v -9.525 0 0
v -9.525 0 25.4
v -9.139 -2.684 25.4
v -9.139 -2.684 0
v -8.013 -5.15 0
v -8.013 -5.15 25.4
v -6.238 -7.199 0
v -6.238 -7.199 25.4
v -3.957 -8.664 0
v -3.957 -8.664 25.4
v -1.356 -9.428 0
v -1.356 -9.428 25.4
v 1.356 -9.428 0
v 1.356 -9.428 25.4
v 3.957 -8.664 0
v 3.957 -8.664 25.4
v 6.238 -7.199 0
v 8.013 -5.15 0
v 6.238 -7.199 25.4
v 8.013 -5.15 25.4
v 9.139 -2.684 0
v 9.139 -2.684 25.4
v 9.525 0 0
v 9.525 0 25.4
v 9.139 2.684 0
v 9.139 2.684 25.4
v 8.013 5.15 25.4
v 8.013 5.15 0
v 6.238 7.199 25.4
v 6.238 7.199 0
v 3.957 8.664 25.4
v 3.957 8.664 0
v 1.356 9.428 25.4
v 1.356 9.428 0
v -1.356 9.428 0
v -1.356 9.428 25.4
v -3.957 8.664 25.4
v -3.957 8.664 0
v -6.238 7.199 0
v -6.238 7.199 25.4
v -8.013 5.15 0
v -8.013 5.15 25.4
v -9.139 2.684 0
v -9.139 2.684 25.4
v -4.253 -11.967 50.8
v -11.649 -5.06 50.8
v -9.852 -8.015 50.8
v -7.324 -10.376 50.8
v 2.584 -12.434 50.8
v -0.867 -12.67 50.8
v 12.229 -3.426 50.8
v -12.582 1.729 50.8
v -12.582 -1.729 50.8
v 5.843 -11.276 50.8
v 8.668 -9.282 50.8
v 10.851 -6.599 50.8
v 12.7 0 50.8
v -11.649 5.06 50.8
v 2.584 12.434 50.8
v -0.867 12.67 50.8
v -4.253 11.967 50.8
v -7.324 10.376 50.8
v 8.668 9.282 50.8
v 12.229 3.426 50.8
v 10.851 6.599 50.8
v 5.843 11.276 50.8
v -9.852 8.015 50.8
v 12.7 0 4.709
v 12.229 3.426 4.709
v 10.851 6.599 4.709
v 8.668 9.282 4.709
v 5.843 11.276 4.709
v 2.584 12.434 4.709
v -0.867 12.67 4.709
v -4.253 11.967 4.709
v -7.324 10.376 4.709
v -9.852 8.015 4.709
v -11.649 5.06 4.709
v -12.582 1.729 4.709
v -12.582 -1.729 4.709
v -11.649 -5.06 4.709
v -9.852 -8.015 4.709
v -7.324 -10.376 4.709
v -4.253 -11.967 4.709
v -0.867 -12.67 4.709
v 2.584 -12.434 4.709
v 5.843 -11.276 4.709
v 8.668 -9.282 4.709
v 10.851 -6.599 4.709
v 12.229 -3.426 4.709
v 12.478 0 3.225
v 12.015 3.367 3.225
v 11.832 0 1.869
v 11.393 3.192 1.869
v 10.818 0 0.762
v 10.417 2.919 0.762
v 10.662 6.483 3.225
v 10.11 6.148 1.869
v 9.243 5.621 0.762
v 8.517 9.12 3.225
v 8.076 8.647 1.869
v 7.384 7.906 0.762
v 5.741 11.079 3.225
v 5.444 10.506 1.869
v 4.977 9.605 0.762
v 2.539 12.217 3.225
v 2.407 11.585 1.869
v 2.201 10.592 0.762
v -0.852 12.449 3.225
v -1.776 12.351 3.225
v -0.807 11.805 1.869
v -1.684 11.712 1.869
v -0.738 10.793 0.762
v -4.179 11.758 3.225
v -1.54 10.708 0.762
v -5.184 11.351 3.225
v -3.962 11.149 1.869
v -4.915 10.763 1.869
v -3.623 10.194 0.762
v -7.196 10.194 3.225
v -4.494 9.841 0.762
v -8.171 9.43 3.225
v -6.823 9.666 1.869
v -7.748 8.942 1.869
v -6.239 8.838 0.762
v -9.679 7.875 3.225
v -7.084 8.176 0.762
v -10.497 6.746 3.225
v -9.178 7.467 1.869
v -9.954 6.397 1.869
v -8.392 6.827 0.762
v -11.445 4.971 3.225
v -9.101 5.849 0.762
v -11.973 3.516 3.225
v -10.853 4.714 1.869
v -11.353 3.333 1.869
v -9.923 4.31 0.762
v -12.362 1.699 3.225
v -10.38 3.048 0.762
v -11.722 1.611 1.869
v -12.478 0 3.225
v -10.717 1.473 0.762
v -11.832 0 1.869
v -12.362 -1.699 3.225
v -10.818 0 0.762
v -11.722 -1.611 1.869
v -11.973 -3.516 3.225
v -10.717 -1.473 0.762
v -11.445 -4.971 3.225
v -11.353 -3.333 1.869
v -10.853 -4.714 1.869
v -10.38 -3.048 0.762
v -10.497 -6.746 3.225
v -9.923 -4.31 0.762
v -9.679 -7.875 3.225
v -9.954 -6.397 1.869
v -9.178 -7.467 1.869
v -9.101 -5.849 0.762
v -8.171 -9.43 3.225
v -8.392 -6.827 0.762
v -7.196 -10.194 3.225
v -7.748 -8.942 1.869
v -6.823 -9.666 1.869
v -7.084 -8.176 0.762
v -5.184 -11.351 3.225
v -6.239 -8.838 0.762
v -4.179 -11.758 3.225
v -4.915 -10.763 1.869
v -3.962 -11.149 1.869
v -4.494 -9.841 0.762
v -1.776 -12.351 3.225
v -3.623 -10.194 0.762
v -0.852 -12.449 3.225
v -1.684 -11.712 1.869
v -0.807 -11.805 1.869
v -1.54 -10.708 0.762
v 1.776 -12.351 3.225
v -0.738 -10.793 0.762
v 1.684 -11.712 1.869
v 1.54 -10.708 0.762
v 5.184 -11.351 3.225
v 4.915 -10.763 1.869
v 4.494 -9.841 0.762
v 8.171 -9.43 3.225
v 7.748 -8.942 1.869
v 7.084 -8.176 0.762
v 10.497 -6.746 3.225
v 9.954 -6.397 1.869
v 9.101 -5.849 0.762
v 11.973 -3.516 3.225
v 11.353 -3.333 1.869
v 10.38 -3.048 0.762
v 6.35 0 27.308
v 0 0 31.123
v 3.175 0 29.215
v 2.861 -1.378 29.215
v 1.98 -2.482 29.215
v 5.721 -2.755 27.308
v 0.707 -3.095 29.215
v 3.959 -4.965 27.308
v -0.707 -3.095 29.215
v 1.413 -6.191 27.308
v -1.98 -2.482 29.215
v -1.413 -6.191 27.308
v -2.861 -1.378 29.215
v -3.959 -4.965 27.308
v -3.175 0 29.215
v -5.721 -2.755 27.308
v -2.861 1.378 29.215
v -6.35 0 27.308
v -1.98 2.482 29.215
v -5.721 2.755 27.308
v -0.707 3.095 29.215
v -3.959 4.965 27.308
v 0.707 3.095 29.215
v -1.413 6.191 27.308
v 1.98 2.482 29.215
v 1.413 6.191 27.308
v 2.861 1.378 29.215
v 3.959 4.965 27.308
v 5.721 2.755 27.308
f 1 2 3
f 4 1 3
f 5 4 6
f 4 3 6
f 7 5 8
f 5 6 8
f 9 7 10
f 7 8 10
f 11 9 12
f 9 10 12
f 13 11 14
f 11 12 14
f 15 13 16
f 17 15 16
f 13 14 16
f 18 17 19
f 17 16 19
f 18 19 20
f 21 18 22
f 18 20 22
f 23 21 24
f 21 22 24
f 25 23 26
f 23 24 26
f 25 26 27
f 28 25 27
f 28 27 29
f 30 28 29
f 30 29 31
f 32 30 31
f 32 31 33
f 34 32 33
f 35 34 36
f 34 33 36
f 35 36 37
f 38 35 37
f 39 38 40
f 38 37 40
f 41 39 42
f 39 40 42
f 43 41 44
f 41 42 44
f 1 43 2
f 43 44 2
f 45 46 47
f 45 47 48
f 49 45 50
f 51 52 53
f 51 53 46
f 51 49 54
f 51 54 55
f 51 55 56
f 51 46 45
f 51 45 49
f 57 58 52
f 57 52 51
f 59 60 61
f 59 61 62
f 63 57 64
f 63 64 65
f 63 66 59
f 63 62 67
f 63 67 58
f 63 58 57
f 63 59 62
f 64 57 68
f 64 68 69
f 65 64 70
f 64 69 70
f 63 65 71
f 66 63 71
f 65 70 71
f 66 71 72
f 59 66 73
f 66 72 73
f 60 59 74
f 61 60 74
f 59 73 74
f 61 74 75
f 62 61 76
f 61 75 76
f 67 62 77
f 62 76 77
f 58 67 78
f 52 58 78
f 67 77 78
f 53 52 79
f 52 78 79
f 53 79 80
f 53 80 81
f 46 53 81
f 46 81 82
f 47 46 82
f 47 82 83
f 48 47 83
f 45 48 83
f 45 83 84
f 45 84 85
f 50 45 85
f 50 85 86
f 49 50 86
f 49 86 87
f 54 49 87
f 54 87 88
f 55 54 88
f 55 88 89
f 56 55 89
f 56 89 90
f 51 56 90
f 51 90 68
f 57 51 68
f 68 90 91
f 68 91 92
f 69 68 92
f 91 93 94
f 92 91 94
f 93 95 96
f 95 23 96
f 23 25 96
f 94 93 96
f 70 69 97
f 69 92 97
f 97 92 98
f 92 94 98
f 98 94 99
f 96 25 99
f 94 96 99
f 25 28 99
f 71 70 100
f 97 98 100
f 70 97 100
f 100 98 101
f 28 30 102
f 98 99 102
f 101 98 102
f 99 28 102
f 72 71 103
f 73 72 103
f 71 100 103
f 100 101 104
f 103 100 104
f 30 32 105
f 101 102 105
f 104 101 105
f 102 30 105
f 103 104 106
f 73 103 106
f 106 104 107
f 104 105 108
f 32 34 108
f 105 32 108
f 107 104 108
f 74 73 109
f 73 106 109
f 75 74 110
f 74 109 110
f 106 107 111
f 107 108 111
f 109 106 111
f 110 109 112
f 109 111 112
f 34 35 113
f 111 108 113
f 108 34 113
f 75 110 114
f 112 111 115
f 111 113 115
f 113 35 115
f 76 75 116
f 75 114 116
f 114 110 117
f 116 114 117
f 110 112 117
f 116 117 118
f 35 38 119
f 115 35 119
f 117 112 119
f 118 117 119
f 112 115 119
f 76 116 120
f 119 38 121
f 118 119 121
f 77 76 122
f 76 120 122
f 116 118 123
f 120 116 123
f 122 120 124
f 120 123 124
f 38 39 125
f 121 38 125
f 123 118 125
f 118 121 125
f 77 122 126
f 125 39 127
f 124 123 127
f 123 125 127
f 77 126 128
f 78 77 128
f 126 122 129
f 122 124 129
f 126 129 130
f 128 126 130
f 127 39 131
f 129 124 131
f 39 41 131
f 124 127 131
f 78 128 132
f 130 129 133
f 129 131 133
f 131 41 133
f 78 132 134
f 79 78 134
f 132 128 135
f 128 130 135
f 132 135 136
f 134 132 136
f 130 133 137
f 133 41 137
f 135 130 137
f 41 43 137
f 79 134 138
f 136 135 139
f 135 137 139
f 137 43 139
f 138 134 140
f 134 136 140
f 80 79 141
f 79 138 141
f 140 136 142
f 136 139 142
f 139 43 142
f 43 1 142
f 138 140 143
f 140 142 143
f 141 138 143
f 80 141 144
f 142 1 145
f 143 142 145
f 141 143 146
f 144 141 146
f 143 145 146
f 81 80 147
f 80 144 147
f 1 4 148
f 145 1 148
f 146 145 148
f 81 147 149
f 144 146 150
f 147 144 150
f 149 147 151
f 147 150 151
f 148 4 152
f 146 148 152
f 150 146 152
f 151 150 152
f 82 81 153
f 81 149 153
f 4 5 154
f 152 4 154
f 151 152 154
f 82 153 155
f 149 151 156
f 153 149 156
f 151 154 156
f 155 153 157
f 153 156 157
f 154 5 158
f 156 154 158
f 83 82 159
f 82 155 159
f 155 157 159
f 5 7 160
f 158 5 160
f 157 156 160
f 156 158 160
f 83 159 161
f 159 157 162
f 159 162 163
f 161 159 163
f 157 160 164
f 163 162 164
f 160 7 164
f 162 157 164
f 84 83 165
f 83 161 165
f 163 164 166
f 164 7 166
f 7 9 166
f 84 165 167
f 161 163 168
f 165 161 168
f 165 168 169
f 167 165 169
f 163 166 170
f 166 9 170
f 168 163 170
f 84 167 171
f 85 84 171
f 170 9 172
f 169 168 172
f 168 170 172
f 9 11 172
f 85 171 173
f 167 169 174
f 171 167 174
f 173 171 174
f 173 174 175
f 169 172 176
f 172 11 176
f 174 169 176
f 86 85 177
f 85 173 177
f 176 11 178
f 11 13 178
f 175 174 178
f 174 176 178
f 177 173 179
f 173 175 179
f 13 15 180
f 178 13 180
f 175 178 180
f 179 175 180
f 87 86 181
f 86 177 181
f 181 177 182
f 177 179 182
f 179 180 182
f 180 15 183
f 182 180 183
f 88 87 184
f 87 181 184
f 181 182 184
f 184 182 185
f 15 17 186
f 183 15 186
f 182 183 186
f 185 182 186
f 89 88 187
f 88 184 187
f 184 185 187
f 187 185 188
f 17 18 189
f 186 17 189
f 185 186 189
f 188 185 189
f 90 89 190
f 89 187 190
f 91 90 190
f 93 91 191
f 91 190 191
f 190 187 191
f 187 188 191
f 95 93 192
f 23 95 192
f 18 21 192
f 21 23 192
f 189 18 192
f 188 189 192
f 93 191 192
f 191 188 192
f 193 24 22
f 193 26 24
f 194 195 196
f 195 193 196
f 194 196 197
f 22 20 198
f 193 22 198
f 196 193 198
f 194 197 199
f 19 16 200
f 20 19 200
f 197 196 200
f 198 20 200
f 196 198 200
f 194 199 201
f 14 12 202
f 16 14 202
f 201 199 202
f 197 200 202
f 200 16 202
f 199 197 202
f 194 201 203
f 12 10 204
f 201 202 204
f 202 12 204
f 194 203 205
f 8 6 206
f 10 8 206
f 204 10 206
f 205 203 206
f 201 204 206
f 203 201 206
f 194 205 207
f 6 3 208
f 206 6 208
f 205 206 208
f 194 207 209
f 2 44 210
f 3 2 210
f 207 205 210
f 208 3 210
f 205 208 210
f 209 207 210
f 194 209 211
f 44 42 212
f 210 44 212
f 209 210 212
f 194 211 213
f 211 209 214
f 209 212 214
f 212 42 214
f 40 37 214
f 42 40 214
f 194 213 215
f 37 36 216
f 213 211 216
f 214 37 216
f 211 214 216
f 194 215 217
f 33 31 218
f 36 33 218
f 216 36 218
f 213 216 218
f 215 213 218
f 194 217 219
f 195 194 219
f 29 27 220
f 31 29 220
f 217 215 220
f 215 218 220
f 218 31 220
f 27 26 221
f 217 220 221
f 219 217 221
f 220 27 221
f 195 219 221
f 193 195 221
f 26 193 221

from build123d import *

# Parameters (mm, degrees)
F0_R     = 12.7
F1_DEPTH = 50.8
F3_D     = 19.05
F3_DEPTH = 25.4
F3_TIP   = 5.7231973962


# Not quite as in the source:
# - a fillet or chamfer that OpenCascade refuses, or shapes differently, is made with other operations: its cross-section is extruded or revolved along the edge and cut away or added


with BuildPart() as f1:
    # F0 (on Top) → F1 (new body)
    with BuildSketch(Plane.XY):
        Circle(F0_R)
    extrude(amount=F1_DEPTH)

    # F3
    with Locations(Plane(origin=(0, 0, 0), x_dir=(1, 0, 0), z_dir=(0, 0, -1))):
        with Locations((0, 0)):
            Hole(F3_D / 2, depth=F3_DEPTH)
            with Locations((0, 0, -(F3_DEPTH + F3_TIP / 2))):  # 118° drill point
                Cone(0, F3_D / 2, F3_TIP, mode=Mode.SUBTRACT)

    # F4: fillet of radius 5.08 on 1 edges, made by hand

    # F4_s1 → F4_t2 (revolve, cut)
    with BuildSketch(Plane.XZ):
        with BuildLine():
            ThreePointArc((12.7, 4.7092860393), (11.8321134838, 1.8694797079), (9.525, 0))
            Line((9.525, 0), (12.7, 0))
            Line((12.7, 0), (12.7, 4.7092860393))
        make_face()
    revolve(axis=Axis((0, 0, 0), (0, 0, 1)), mode=Mode.SUBTRACT)


solid = f1.part
